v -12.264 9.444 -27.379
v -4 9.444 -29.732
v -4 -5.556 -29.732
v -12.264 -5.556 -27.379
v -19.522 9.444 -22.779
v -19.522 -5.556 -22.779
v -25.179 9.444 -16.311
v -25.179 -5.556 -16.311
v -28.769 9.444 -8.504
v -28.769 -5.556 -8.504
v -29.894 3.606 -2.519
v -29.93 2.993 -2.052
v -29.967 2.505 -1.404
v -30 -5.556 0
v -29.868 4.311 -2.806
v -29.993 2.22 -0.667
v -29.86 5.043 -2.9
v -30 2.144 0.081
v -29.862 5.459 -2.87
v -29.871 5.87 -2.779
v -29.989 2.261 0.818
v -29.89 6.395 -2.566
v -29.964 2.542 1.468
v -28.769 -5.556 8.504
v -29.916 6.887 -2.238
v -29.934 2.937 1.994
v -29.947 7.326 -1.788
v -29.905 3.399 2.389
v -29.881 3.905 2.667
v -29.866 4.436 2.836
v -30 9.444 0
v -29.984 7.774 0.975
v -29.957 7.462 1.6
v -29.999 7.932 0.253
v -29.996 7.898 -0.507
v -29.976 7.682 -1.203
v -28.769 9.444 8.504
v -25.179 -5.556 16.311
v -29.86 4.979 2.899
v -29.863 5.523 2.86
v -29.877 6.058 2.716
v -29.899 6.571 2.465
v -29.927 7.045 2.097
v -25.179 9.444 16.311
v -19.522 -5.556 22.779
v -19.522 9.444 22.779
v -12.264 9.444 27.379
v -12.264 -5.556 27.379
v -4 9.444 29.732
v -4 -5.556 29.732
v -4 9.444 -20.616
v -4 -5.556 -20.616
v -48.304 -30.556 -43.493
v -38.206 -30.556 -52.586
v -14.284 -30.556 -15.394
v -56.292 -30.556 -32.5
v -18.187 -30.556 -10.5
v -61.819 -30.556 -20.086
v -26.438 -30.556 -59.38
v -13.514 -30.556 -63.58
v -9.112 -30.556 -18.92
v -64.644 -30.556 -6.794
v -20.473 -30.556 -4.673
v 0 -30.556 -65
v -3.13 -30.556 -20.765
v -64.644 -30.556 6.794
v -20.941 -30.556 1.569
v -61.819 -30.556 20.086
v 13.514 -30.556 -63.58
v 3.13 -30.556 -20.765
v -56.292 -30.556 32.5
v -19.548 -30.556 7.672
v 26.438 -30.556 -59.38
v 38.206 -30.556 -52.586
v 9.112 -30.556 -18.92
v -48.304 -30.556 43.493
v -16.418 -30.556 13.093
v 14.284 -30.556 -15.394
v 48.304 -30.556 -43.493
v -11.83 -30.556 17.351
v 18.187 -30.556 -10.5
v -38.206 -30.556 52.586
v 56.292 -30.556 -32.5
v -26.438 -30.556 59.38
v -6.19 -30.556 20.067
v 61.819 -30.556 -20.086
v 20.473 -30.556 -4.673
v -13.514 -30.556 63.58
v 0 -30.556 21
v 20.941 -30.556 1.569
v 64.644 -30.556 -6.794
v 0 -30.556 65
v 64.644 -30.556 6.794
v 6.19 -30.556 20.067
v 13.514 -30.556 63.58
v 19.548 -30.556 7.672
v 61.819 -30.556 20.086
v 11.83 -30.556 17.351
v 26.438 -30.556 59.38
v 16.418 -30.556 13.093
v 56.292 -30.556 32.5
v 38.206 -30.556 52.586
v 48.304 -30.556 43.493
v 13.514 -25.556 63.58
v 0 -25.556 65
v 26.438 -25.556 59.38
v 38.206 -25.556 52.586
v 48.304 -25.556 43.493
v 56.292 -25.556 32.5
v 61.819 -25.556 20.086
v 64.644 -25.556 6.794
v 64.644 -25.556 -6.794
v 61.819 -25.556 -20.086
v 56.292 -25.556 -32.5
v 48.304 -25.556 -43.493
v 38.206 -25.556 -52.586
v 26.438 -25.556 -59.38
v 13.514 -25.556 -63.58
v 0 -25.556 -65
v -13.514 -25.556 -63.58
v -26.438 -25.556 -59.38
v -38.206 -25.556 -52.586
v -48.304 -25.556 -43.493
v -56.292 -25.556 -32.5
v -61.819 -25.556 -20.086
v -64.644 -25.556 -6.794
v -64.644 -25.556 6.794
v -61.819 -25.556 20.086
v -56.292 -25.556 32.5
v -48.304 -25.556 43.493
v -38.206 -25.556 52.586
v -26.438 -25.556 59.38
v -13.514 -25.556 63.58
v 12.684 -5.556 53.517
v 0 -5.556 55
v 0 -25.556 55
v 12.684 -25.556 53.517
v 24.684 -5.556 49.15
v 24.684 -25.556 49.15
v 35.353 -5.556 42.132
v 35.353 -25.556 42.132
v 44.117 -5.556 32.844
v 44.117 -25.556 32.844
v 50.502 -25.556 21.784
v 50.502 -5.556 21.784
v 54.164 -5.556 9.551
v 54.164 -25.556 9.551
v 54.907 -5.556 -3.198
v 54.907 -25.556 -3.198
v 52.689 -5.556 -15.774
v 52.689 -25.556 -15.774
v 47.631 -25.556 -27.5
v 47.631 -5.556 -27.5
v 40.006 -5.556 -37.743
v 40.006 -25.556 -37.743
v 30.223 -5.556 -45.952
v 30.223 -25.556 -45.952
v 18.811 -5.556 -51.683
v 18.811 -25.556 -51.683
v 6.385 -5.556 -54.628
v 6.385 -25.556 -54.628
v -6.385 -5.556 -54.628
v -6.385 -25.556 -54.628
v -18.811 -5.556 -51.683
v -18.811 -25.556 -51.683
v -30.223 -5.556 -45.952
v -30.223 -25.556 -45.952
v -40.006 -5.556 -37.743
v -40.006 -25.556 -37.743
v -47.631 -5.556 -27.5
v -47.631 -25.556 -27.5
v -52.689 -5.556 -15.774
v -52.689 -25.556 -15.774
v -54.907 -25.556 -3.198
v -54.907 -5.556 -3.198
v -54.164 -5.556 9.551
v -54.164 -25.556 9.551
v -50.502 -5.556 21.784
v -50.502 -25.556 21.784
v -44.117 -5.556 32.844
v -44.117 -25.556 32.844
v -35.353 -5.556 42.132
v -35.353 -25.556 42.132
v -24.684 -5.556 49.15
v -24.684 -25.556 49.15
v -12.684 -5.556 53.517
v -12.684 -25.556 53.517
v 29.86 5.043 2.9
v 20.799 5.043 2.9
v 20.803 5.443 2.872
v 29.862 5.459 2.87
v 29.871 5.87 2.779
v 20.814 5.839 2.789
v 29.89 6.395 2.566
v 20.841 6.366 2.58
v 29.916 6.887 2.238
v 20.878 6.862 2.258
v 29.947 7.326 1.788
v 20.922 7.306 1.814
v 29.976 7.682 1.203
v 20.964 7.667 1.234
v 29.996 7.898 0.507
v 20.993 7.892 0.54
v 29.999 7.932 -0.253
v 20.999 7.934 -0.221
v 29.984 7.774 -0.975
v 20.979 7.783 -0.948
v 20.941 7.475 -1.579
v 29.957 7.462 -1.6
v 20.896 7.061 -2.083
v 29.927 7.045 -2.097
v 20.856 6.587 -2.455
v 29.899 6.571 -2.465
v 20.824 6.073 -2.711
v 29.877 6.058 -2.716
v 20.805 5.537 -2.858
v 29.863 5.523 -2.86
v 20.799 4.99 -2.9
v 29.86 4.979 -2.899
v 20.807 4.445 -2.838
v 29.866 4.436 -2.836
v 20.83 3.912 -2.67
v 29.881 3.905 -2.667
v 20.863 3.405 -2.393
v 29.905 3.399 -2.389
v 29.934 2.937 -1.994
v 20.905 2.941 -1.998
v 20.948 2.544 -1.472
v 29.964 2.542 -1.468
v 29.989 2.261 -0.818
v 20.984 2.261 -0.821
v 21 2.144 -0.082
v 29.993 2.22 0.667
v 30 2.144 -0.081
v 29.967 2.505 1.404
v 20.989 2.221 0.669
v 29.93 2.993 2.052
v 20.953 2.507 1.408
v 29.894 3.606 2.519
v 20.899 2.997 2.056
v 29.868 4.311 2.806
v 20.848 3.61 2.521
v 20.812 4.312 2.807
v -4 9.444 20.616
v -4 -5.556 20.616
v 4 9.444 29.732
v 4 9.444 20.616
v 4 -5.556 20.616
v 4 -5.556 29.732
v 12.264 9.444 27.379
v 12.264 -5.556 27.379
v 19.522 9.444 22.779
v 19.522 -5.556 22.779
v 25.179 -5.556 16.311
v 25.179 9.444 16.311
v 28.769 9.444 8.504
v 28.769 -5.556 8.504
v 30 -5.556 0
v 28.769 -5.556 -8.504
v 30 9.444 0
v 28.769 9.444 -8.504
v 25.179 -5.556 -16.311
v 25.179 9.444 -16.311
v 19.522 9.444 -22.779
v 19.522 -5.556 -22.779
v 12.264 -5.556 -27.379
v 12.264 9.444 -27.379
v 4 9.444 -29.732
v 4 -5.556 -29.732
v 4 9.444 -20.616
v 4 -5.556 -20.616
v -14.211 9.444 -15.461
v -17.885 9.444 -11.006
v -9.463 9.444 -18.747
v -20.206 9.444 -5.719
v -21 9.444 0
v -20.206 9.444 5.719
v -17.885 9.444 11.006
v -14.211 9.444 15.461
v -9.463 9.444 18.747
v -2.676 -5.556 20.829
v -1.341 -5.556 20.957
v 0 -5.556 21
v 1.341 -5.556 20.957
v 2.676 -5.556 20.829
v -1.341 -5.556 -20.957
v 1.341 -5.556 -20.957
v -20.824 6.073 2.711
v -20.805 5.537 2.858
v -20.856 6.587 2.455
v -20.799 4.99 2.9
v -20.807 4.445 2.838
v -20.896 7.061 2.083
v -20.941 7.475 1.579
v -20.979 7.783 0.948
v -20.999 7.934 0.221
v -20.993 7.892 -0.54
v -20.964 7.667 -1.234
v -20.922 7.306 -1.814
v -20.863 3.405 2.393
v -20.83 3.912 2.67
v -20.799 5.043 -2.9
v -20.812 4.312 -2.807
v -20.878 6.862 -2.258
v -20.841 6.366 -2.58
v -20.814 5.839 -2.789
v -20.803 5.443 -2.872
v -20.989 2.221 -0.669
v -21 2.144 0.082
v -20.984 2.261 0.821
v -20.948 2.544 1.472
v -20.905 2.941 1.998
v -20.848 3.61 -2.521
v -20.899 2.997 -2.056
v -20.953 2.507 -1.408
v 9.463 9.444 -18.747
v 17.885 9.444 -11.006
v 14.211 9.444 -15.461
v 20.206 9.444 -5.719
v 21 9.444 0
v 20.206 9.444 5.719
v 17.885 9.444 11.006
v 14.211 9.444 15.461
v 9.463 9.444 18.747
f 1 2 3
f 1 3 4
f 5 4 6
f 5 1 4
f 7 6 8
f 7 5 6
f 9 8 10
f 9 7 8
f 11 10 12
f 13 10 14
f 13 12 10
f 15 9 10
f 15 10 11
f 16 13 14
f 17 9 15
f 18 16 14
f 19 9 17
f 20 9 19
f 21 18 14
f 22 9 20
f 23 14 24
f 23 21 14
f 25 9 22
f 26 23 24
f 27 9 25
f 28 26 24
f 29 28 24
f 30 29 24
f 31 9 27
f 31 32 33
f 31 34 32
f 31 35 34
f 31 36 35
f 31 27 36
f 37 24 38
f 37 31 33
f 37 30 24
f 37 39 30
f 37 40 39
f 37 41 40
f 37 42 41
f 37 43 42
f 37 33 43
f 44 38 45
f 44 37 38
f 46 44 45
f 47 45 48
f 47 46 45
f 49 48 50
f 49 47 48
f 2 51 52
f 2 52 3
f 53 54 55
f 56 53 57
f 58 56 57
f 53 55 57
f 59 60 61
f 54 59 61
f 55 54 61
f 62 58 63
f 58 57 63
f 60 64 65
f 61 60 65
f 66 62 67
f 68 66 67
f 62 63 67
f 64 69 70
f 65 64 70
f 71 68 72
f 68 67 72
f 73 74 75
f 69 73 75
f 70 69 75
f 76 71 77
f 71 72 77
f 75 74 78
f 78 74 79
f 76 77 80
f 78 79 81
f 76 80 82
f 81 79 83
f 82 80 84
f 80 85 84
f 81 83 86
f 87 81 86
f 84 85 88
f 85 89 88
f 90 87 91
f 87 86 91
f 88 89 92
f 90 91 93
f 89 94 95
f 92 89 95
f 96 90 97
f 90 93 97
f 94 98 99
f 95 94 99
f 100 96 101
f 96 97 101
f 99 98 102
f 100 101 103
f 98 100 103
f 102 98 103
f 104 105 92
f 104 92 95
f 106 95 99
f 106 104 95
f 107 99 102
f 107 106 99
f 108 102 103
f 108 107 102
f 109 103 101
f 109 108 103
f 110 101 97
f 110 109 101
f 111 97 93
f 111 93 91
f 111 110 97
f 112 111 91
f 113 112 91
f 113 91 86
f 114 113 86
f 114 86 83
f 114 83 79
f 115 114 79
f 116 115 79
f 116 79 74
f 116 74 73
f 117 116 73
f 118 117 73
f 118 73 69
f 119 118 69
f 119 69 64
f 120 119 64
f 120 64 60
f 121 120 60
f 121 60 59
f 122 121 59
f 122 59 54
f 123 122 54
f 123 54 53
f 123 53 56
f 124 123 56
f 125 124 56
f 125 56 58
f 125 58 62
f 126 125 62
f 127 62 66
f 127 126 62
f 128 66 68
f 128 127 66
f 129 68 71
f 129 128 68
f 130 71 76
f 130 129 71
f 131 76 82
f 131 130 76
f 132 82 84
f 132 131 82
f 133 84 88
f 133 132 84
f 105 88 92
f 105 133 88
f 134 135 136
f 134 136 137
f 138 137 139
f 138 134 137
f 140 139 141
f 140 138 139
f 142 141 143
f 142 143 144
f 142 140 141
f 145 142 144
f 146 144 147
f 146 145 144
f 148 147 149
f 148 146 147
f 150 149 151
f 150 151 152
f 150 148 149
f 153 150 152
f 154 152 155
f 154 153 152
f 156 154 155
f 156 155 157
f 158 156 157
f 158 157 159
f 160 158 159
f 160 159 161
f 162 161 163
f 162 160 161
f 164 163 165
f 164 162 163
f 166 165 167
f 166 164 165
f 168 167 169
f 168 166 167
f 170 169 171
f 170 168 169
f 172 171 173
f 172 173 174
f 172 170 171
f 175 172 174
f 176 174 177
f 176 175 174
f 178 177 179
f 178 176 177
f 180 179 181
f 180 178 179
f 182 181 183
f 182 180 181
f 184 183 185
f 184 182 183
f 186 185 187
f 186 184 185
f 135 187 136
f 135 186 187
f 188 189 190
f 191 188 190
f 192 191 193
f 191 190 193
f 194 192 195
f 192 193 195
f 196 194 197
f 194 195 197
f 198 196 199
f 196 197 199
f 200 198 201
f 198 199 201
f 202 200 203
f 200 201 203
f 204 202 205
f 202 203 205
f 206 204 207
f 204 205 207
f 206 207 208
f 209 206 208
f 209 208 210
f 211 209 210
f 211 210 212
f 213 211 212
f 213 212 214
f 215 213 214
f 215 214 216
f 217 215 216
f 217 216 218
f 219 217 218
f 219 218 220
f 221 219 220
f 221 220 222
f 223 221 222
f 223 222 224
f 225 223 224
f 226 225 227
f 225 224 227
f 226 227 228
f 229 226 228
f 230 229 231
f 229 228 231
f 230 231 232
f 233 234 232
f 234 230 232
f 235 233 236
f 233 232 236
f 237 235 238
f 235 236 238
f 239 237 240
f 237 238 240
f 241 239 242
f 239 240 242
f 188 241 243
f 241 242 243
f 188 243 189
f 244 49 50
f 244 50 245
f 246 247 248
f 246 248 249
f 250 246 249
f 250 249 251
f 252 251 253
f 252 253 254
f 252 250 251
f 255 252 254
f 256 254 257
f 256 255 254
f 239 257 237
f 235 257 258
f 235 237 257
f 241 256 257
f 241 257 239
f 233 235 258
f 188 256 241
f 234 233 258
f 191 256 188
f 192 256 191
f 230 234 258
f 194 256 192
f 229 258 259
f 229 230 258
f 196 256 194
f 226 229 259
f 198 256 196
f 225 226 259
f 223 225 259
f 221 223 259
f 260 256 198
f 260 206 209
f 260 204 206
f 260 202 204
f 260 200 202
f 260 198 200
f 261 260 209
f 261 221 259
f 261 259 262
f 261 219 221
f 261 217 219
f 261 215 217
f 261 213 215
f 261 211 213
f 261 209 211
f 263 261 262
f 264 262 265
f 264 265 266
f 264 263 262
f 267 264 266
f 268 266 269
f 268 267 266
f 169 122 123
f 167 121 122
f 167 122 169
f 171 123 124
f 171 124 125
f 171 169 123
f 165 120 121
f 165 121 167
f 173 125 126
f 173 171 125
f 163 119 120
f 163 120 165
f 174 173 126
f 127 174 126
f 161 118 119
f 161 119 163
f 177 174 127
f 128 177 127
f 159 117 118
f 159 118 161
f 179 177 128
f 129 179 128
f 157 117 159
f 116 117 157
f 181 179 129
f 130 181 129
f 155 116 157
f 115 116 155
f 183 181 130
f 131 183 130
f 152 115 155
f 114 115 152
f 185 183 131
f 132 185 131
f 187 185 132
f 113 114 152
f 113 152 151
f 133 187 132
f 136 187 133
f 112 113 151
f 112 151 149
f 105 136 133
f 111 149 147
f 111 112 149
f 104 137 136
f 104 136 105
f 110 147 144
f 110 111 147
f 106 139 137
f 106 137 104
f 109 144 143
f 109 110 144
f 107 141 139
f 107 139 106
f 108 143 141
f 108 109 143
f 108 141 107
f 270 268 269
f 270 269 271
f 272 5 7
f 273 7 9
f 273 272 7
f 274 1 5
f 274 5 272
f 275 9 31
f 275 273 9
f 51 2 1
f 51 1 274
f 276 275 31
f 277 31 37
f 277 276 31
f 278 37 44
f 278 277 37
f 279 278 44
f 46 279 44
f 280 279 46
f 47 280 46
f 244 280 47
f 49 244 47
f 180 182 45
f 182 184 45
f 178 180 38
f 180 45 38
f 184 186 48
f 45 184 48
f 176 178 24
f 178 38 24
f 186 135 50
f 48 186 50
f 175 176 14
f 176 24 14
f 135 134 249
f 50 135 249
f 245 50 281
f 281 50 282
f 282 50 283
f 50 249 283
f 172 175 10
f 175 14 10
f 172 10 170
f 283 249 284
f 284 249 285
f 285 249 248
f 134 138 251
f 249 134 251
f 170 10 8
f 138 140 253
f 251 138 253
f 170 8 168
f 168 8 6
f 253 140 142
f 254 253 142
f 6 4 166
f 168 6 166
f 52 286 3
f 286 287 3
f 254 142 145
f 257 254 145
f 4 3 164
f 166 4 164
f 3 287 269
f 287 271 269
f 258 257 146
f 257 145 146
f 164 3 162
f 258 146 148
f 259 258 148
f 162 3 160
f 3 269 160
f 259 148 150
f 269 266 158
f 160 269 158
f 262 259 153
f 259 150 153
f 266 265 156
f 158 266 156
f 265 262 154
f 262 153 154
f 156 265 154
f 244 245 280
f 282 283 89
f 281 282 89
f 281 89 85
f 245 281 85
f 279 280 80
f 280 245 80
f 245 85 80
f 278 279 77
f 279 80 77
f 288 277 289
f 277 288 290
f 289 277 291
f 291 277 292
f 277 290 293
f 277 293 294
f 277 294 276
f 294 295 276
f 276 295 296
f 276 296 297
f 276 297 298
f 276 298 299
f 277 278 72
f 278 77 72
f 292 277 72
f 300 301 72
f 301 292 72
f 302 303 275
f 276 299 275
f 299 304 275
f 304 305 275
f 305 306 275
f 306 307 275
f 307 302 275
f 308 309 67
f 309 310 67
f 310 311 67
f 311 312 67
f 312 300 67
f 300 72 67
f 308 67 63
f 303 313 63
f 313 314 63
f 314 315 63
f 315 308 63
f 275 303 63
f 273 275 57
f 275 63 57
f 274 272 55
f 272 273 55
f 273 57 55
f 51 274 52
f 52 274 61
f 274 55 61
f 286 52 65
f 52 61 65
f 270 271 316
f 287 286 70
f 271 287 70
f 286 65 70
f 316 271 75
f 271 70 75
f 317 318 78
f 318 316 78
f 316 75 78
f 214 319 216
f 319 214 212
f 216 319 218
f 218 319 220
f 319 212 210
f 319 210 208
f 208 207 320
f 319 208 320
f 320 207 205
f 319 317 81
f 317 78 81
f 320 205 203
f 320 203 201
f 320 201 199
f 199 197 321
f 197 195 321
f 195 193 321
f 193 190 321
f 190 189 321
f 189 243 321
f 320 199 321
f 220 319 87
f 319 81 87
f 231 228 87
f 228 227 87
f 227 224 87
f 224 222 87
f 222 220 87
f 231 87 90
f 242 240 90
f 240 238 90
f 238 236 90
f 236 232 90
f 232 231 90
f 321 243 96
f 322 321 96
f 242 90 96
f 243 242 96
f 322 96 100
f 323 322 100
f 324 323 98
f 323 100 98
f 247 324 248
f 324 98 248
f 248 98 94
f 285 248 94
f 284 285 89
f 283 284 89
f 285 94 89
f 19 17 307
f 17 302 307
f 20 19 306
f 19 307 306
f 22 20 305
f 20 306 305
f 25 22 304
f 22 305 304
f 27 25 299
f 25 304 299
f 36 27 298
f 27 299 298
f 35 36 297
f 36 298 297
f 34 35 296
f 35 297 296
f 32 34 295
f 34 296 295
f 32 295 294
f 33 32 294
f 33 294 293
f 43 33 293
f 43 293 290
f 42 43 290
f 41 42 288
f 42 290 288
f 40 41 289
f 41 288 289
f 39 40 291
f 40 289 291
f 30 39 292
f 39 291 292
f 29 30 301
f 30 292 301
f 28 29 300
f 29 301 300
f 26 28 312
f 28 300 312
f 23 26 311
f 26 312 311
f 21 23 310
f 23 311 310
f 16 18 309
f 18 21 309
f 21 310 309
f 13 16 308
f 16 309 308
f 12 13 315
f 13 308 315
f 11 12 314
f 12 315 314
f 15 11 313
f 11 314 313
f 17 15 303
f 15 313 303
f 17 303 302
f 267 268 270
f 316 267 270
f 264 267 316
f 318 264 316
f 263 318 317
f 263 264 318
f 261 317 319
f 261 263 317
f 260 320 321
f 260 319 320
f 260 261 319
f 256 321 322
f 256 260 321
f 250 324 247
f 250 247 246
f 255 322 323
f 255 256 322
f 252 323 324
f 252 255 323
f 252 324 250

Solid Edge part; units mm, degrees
sketch "Sketch1" plane through (0, 0, 0) normal (1, 0, 0) x (0, 1, 0)
  line L0 (-30.5556, 21) -> (-30.5556, 65)
  line L1 (-30.5556, 65) -> (-25.5556, 65)
  line L2 (-25.5556, 65) -> (-25.5556, 55)
  line L3 (-25.5556, 55) -> (-5.5556, 55)
  line L4 (-5.5556, 55) -> (-5.5556, 30)
  line L5 (-5.5556, 30) -> (9.4444, 30)
  line L6 (9.4444, 30) -> (9.4444, 21)
  line L7 (9.4444, 21) -> (-30.5556, 21)
  dimension "D1" = 5
  dimension "D2" = 20
  dimension "D3" = 15
  dimension "D4" = 21
  dimension "D5" = 10
  dimension "D6" = 25
  dimension "D7" = 55
revolve "RevolvedProtrusion1" add sketch "Sketch1" angle 360 about axis through (0, -60, 0) along (0, 1, 0)
sketch "Sketch2" plane through (0, -5.5556, 0) normal (0, 1, 0) x (-1, 0, 0)
  line L0 (-4, 40.4732) -> (4, 40.4732)
  line L1 (4, 40.4732) -> (4, -40.4732)
  line L2 (4, -40.4732) -> (-4, -40.4732)
  line L3 (-4, -40.4732) -> (-4, 40.4732)
  dimension "D1" = 8
  dimension "D2" = 80.9463
  dimension "D3" = 4
extrude "Cutout1" cut sketch "Sketch2" along normal blind 383.6956
hole "Hole_2" at (0, 5.0428, 0) direction (1, 0, 0) diameter 5.8 end up to next
hole "Hole_3" at (0, 5.0428, 0) direction (-1, 0, 0) diameter 5.8 end up to next
